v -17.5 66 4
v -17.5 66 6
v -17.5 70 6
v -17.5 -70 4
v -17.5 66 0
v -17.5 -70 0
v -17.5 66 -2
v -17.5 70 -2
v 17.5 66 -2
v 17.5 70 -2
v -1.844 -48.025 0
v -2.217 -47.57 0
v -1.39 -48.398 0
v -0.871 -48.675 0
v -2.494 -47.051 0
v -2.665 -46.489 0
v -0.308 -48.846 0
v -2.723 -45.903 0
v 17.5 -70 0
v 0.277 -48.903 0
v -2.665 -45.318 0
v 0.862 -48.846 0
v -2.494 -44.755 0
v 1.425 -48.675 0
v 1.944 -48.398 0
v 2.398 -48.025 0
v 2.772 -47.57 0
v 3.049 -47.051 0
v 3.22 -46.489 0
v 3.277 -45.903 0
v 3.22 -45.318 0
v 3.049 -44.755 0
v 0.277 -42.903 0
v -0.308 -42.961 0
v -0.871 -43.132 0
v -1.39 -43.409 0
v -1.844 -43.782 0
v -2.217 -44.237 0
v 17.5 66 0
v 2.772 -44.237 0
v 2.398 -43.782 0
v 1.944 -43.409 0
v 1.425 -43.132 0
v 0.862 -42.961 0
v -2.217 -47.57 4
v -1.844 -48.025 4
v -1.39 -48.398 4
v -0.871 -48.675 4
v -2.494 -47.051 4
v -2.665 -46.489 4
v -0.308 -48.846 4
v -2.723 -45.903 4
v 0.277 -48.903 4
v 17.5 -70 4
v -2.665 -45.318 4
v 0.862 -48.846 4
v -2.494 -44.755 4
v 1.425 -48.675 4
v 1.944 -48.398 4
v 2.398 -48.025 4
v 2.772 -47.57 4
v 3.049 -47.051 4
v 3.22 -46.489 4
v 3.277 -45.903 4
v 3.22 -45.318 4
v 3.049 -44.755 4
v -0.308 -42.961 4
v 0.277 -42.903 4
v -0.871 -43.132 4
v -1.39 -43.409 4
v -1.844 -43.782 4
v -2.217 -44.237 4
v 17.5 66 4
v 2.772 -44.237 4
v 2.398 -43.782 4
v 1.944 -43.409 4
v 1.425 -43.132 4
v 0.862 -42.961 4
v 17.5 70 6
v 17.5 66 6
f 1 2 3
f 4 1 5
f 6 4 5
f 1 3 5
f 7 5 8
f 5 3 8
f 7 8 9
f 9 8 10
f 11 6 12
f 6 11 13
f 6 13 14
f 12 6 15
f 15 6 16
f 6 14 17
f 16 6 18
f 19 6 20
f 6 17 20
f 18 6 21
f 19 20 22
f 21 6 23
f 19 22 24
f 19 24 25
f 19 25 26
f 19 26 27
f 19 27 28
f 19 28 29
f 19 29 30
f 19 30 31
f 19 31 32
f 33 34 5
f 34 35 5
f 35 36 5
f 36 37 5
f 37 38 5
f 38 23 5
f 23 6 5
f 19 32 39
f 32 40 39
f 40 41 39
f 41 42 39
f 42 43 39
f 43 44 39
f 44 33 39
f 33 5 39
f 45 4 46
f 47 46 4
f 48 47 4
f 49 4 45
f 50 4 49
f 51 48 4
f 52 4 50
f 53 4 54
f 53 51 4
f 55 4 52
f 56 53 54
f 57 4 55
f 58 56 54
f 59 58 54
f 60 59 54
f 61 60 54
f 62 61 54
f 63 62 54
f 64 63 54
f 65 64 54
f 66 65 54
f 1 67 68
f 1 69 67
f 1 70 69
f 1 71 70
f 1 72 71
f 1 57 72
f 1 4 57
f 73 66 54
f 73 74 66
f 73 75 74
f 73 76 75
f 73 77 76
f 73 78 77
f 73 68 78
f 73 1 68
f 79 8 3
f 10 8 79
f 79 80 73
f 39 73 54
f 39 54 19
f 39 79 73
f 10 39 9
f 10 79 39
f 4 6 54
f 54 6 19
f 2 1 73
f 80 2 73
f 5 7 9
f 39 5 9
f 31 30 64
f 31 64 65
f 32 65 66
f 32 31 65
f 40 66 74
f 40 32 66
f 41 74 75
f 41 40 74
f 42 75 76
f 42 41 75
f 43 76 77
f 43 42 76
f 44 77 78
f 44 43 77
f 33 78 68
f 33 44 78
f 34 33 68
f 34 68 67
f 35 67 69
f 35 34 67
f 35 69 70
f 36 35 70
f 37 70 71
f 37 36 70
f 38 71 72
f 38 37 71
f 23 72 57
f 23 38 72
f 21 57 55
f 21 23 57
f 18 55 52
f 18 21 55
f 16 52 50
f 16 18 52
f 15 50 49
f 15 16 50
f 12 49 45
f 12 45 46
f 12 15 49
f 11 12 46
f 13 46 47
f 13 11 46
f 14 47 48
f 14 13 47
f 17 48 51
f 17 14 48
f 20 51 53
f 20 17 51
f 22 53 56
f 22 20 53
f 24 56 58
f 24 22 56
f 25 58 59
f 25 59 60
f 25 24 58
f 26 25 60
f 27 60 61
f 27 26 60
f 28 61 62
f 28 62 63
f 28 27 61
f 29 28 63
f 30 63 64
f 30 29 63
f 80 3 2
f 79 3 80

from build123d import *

# Parameters (mm, degrees)
SKETCH1_W           = 35
SKETCH1_H           = 140
SKETCH1_R           = 3
BOSS_EXTRUDE1_DEPTH = 4
SKETCH2_W           = 35
SKETCH2_H           = 8
BOSS_EXTRUDE2_DEPTH = 4


with BuildPart() as part:
    # Sketch1 → Boss-Extrude1 (new body)
    with BuildSketch(Plane.XY):
        Rectangle(SKETCH1_W, SKETCH1_H)
        with Locations((0.277177956, -45.903341346)):
            Circle(SKETCH1_R, mode=Mode.SUBTRACT)
    extrude(amount=BOSS_EXTRUDE1_DEPTH)

    # Sketch2 → Boss-Extrude2 (add)
    with BuildSketch(Plane(origin=(0, 70, 0), x_dir=(1, 0, 0), z_dir=(0, 1, 0))):
        with Locations((0, -2)):
            Rectangle(SKETCH2_W, SKETCH2_H)
    extrude(amount=-BOSS_EXTRUDE2_DEPTH)


solid = part.part
